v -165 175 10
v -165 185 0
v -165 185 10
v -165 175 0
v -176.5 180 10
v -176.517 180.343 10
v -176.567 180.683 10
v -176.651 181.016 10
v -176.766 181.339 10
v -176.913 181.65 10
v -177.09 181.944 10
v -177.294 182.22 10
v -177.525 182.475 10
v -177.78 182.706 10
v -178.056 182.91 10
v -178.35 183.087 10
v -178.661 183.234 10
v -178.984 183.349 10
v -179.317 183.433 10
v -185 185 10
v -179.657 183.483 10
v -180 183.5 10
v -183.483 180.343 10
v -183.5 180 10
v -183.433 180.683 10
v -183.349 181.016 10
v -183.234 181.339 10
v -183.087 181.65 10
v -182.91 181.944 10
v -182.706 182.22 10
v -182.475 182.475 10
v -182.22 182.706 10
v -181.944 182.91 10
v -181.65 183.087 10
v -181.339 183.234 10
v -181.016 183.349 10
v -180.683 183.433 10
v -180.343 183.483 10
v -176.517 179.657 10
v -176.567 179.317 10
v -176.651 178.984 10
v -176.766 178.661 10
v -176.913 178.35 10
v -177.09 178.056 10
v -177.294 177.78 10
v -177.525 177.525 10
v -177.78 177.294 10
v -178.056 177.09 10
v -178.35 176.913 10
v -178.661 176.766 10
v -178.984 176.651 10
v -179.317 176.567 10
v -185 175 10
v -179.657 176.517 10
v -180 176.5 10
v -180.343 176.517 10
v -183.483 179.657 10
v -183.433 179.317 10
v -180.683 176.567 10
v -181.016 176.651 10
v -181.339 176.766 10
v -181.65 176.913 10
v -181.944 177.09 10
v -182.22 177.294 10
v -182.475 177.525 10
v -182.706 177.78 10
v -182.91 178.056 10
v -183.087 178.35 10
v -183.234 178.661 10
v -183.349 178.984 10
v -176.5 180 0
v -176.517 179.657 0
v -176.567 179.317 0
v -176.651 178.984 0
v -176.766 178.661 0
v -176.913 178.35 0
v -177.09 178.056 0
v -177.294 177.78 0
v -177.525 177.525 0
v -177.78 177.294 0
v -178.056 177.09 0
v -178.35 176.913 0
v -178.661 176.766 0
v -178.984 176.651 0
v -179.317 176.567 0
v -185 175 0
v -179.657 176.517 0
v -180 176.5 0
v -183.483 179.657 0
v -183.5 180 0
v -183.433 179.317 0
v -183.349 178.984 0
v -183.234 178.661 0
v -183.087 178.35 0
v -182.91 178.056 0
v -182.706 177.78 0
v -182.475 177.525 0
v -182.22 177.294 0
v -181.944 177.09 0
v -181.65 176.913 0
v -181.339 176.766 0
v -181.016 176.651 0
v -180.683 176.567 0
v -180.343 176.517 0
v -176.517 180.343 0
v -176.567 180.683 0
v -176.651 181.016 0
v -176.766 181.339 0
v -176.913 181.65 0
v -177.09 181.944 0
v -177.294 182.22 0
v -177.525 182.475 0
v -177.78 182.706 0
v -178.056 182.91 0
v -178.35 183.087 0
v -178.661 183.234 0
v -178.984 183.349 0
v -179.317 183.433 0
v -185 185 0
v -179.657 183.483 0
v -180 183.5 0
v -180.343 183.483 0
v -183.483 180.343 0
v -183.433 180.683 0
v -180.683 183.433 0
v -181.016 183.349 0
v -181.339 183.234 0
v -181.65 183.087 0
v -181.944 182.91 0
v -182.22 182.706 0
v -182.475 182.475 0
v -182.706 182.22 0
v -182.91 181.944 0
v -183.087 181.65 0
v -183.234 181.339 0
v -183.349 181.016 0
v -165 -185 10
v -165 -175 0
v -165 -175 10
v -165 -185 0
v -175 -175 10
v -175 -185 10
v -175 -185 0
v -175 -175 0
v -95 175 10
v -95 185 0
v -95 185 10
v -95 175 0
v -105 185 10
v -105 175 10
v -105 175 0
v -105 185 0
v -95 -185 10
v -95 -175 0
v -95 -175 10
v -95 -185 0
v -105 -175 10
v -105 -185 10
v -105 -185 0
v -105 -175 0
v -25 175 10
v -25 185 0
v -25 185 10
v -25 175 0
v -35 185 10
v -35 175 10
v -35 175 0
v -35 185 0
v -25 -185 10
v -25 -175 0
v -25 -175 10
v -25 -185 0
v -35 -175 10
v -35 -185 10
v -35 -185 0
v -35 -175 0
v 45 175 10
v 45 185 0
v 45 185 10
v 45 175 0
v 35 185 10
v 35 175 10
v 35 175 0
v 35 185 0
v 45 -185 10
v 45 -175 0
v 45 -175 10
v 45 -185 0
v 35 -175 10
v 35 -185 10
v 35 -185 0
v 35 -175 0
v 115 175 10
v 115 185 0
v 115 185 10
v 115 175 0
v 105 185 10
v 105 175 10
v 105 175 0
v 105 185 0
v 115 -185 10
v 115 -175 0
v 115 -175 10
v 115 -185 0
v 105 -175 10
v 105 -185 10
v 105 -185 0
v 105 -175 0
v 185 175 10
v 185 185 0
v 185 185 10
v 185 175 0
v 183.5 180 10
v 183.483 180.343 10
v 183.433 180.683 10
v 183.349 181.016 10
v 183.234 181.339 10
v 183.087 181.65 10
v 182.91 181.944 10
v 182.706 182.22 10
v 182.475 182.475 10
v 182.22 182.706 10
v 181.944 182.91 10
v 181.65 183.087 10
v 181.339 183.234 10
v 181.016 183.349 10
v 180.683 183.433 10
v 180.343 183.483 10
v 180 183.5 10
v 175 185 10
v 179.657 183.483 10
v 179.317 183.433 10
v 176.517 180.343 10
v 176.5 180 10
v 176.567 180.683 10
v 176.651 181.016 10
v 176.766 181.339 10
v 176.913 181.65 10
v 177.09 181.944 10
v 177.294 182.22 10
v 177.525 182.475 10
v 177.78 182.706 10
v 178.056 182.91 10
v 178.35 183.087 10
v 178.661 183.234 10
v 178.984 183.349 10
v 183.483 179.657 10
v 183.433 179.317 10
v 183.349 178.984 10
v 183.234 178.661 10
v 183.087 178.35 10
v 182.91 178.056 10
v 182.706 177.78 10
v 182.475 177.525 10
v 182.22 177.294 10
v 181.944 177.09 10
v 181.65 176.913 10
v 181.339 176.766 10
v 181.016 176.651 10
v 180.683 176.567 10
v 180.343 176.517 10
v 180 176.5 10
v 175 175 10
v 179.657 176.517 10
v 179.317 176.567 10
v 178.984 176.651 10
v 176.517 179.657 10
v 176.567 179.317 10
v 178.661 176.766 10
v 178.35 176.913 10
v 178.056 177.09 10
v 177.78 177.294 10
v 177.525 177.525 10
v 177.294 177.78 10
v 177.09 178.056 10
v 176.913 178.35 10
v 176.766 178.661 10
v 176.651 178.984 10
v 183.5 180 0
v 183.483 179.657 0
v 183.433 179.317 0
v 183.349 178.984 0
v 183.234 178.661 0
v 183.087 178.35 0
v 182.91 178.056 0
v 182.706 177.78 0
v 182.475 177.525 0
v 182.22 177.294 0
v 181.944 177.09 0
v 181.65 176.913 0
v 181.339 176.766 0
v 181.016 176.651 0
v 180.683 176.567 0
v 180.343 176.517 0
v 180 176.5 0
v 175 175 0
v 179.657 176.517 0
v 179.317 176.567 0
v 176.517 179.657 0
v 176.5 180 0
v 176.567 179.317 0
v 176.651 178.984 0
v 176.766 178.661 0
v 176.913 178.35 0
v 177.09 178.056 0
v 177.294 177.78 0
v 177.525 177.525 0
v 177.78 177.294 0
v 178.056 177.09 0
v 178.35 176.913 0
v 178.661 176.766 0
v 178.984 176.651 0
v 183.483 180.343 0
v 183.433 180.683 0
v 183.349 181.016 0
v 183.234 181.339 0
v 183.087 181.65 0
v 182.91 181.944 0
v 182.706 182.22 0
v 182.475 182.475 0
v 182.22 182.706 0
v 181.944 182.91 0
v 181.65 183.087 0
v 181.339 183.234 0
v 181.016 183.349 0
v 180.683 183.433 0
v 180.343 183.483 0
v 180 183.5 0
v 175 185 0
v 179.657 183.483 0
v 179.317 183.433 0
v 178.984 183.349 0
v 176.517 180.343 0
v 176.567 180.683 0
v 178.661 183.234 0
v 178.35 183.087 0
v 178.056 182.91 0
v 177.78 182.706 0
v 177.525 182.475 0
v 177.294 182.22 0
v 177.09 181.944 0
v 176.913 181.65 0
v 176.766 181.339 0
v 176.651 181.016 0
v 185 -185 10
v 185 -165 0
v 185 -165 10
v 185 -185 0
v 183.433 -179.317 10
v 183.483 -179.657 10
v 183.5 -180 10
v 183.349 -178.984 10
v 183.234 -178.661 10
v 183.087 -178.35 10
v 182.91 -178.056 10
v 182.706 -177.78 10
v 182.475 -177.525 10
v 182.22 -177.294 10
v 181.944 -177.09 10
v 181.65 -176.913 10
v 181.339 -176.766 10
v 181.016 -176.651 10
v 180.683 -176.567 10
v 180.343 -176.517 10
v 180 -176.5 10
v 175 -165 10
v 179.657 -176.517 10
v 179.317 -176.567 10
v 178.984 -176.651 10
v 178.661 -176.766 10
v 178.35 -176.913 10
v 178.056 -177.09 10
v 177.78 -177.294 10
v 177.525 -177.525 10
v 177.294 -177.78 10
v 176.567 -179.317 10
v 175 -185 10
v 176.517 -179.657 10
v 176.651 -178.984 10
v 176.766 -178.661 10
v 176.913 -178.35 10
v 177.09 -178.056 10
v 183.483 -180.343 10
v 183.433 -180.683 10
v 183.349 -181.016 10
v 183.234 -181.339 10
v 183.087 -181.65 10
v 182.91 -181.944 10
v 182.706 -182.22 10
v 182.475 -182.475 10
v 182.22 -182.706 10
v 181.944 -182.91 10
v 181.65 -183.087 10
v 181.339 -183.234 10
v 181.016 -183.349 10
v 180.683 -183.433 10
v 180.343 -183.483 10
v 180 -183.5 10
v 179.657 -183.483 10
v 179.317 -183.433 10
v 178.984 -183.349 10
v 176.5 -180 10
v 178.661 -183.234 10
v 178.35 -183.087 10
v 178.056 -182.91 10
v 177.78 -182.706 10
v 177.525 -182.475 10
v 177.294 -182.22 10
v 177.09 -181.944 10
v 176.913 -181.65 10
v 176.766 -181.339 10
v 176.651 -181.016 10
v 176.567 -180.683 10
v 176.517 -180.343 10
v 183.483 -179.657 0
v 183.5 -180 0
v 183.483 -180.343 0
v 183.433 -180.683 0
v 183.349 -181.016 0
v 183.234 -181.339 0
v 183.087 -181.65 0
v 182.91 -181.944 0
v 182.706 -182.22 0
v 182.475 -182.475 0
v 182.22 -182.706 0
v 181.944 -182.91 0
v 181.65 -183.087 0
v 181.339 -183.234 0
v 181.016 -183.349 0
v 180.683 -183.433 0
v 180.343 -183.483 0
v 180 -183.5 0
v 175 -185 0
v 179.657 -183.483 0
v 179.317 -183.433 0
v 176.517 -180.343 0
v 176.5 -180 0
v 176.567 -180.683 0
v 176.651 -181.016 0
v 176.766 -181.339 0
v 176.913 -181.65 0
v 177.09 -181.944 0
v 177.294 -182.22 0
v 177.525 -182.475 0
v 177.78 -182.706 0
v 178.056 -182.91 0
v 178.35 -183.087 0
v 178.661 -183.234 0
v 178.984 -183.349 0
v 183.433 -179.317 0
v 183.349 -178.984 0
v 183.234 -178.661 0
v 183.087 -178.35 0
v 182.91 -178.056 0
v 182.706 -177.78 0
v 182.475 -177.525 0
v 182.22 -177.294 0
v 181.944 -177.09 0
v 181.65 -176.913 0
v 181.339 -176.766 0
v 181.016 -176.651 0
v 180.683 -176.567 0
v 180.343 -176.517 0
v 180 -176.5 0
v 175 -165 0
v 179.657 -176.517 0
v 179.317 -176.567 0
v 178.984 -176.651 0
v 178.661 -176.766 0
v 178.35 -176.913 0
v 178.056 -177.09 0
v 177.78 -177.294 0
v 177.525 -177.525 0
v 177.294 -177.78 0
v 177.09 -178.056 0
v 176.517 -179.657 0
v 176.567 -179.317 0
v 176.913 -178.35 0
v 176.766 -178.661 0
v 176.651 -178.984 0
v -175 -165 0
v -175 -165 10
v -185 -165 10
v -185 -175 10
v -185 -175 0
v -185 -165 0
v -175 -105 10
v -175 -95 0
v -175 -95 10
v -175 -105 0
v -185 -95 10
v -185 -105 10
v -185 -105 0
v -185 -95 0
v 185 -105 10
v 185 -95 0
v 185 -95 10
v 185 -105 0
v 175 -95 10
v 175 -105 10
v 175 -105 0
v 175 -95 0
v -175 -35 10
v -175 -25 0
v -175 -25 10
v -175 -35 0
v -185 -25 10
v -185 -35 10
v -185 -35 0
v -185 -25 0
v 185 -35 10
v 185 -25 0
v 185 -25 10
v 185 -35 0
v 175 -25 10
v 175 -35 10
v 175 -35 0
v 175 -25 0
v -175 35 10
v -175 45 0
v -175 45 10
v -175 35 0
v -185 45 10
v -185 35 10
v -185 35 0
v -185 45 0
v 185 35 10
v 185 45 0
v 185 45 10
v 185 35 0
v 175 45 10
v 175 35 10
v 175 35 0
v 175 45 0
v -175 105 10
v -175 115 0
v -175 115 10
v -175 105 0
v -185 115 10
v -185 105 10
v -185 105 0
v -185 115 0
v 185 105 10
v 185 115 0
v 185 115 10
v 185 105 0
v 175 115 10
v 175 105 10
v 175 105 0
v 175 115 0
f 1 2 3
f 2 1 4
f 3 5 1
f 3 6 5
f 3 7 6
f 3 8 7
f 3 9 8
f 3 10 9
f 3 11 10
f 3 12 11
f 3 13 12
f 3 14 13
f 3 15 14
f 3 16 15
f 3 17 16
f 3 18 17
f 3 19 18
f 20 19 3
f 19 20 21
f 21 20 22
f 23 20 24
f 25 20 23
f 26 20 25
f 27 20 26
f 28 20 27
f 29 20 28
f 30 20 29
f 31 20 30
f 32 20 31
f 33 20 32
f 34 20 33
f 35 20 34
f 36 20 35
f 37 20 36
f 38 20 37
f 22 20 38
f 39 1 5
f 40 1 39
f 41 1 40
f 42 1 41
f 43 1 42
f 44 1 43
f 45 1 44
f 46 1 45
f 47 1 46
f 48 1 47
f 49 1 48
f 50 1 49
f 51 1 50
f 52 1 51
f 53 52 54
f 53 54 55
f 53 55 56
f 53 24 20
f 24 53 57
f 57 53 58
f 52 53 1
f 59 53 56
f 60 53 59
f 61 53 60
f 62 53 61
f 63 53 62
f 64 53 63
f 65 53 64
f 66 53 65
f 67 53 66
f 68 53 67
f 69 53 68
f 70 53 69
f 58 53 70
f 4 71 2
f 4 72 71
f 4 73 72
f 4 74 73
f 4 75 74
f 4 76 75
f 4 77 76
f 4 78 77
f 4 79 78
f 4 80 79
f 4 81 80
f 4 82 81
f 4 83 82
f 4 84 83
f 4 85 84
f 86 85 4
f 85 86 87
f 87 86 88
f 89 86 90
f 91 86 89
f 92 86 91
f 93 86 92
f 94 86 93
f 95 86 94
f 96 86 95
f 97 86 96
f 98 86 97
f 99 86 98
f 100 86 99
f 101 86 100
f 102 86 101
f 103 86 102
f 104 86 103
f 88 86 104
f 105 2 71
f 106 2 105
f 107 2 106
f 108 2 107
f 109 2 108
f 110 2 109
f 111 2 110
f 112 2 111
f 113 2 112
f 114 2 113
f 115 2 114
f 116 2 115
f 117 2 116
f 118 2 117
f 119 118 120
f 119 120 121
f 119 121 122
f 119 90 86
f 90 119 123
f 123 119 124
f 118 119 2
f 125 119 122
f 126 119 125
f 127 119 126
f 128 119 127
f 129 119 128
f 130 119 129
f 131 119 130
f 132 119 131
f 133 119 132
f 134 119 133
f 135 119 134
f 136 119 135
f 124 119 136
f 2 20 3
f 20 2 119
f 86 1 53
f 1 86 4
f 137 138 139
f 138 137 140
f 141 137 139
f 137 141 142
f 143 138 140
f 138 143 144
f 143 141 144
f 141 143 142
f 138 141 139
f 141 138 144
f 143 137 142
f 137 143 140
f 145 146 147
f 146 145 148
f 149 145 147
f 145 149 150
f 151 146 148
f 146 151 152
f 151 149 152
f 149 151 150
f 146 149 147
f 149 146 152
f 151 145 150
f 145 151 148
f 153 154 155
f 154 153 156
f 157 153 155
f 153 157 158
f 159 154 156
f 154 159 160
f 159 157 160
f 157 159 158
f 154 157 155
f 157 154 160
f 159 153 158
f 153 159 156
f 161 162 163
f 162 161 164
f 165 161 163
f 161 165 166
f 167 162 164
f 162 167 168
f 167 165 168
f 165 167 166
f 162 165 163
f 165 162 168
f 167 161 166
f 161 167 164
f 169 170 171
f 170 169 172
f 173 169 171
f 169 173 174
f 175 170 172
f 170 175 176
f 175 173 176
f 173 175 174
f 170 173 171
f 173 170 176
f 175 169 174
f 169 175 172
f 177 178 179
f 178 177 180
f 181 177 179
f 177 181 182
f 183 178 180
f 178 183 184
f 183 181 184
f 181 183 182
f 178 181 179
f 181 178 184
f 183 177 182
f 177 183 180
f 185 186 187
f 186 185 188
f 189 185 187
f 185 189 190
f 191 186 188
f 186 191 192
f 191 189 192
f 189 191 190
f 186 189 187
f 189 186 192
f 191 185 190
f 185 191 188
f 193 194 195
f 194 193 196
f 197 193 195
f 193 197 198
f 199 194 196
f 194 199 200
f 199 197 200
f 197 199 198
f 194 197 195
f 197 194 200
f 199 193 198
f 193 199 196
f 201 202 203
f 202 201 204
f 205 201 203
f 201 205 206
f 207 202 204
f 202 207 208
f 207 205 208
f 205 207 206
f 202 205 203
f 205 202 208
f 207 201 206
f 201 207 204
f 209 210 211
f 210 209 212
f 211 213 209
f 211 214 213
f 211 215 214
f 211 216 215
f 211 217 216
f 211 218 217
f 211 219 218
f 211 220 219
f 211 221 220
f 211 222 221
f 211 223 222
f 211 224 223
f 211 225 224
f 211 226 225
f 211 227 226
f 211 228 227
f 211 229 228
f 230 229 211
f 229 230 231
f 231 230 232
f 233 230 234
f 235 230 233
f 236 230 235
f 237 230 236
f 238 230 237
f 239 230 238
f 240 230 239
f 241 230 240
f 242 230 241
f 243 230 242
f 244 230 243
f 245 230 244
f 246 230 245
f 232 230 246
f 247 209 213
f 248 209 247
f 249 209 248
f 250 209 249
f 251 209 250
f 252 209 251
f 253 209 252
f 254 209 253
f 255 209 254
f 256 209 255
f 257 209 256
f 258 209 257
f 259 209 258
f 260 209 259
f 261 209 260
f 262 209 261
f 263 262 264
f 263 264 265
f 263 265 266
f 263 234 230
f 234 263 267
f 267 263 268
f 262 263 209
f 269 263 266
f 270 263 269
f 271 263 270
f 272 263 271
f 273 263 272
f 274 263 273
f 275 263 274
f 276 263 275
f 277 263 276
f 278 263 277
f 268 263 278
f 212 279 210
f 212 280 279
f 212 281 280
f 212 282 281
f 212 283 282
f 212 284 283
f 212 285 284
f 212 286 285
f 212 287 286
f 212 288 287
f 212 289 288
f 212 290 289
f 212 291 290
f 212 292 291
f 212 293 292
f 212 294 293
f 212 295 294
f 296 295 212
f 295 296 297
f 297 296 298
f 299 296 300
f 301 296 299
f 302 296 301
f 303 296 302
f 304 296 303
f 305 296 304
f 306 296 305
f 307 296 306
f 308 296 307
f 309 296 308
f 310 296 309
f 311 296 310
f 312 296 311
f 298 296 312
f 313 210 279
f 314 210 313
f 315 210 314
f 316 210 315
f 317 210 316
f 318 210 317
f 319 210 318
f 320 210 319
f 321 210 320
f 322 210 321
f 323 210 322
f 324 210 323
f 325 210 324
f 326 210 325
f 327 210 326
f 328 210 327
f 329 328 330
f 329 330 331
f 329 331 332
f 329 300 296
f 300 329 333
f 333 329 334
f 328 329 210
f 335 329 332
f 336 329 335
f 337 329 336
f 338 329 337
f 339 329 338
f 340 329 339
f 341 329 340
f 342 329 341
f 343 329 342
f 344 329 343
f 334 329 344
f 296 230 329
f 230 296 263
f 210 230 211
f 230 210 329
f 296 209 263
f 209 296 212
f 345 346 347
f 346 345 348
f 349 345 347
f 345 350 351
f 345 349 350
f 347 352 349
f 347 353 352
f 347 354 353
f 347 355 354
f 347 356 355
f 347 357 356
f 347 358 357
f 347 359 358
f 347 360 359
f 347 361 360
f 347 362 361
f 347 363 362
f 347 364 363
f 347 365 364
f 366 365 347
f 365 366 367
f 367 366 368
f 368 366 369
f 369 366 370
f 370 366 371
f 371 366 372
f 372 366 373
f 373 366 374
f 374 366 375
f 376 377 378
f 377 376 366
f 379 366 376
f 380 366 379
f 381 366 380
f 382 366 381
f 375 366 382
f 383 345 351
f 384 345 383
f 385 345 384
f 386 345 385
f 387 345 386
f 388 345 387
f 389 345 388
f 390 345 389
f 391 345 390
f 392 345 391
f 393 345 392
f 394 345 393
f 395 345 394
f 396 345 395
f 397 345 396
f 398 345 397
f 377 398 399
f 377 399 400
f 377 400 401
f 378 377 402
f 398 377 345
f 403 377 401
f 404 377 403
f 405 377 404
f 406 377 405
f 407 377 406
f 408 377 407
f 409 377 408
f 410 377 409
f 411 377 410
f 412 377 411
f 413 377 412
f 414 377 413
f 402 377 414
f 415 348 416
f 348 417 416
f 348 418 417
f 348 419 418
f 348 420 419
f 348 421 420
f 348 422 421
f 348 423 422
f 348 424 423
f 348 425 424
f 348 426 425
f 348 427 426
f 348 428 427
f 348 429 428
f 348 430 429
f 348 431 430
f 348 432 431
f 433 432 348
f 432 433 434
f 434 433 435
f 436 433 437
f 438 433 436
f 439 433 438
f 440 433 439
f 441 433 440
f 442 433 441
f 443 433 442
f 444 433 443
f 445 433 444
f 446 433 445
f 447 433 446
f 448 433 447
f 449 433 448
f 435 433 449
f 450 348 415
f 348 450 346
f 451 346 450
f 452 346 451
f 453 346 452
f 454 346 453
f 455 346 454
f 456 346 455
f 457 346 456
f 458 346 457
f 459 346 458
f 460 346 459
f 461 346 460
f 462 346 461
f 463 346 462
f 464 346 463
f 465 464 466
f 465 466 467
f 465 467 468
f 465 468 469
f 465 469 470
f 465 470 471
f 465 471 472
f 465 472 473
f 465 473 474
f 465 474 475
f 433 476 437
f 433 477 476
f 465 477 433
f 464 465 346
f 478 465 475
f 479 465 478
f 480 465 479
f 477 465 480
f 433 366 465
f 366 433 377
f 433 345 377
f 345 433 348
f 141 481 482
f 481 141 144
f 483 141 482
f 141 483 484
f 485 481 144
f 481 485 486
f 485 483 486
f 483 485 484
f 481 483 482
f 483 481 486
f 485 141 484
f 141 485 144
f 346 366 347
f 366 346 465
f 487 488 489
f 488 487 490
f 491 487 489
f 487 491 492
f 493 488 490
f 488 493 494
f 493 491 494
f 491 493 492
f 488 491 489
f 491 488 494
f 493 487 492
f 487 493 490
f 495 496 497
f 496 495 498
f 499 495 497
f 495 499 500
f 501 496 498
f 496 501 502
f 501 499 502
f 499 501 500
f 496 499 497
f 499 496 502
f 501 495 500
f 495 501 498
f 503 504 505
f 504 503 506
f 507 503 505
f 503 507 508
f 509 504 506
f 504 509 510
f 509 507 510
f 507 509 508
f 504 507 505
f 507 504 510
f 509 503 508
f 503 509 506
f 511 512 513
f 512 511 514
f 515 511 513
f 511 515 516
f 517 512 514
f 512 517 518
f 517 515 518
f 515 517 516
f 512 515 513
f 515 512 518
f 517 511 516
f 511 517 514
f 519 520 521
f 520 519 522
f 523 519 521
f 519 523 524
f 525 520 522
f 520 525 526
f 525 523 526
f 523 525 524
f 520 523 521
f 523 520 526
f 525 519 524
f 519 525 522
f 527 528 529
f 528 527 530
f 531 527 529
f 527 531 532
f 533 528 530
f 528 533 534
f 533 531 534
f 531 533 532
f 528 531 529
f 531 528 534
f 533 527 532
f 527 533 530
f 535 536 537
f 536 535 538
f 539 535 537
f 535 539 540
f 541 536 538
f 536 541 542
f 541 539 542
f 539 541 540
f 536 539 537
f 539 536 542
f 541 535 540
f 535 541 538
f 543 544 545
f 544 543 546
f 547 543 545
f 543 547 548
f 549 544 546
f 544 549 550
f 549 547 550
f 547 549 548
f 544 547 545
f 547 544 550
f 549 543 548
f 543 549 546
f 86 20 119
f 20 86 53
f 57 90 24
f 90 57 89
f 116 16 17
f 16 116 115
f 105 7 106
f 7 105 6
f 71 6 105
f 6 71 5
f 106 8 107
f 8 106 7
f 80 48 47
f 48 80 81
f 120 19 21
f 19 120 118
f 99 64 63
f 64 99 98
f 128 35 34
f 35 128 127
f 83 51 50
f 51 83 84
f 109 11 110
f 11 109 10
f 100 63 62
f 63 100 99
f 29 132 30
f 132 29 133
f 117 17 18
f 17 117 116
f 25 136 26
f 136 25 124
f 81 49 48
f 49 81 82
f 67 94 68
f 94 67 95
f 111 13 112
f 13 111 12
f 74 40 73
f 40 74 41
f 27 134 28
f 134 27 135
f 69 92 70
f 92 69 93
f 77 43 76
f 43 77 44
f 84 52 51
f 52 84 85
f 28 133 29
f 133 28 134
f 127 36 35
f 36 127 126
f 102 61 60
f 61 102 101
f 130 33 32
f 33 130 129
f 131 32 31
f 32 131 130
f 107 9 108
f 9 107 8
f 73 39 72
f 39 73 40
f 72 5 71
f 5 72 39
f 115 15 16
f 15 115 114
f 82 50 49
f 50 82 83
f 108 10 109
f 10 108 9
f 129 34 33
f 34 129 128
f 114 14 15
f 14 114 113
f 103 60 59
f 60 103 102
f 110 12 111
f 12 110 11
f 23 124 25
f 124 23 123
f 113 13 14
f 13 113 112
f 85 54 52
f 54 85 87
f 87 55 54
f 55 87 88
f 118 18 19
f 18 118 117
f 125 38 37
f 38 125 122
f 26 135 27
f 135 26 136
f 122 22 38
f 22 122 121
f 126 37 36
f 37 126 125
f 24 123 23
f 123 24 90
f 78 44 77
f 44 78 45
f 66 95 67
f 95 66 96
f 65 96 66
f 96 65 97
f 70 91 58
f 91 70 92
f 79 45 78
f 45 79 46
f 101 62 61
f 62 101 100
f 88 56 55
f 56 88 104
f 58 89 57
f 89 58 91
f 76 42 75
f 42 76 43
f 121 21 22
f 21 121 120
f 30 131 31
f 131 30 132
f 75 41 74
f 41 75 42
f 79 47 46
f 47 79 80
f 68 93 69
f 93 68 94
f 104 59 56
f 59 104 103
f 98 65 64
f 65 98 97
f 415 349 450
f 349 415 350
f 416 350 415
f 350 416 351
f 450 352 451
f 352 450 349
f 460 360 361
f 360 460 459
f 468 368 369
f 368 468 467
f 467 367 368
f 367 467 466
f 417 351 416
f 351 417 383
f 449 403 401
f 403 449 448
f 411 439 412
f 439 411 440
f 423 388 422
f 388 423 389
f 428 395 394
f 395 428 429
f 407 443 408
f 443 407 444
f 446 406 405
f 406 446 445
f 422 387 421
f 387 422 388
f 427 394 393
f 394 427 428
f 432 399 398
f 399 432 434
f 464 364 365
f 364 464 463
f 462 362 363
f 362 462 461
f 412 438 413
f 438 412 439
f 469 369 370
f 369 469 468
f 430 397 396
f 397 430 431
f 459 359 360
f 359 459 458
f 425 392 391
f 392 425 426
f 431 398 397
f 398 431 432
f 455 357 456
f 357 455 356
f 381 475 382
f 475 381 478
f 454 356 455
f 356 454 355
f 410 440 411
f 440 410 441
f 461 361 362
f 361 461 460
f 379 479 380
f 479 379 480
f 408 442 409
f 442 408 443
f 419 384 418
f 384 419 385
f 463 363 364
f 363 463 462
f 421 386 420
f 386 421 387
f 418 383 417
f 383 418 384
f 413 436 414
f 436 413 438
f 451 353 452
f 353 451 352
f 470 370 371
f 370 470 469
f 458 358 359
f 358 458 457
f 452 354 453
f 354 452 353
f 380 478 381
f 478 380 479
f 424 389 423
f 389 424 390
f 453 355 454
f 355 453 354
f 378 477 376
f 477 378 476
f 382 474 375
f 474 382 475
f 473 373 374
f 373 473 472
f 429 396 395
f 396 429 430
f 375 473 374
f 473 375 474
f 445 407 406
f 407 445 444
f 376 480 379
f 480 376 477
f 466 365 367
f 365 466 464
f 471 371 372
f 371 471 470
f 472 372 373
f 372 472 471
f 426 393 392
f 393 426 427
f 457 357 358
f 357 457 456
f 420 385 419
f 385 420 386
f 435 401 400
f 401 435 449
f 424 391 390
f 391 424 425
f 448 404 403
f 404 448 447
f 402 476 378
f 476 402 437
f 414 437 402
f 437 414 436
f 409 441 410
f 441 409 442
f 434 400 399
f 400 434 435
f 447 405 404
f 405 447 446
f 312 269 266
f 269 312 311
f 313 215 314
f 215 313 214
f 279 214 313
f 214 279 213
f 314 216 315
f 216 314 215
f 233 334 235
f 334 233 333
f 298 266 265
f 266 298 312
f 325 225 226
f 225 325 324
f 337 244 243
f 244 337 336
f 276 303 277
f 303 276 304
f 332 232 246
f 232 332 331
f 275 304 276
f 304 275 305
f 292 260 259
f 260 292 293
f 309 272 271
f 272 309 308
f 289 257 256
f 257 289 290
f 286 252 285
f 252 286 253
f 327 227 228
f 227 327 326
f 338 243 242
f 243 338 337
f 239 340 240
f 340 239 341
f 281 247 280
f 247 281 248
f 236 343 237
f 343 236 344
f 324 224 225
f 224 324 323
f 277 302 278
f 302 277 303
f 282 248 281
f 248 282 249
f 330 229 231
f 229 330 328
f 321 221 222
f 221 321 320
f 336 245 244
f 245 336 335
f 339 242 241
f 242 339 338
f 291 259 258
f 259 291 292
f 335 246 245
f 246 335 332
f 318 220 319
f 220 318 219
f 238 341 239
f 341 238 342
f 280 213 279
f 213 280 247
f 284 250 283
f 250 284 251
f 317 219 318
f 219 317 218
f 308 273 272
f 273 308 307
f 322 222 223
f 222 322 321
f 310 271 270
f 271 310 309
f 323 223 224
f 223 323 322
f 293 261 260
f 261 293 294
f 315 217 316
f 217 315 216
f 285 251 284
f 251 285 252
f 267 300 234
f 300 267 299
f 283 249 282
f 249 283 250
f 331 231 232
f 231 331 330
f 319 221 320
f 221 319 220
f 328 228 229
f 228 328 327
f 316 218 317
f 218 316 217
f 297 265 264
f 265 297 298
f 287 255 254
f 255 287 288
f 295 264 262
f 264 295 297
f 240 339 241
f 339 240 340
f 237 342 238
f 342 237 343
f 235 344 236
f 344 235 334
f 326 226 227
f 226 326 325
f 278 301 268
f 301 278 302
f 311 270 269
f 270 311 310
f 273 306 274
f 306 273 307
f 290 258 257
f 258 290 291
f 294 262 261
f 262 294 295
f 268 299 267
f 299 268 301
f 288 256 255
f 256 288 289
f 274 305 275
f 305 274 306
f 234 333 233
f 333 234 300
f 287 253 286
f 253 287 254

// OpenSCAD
// ring_04.scad - ring index 4 (z bottom = 40 mm)
$fn = 64; bar = 10; half_b = bar/2; outer = 370; half_outer = outer/2;
front_y = 180; back_y = -180; left_x = -180; right_x = 180;
x_centers = [-170, -100, -30, 40, 110, 180];
z_centers = [5, 85, 155, 225, 295, 365, 435, 505, 575, 645, 715]; ring_z = 40;
module place_box(cx, cy, sx, sy) { translate([cx - sx/2, cy - sy/2, 0]) cube([sx, sy, bar]); }

difference() { union() {
    for (x = x_centers) { place_box(x, front_y, bar, bar); place_box(x, back_y, bar, bar); }
    for (y = x_centers) { place_box(left_x, y, bar, bar); place_box(right_x, y, bar, bar); }
    for (zc = z_centers) if ((zc - half_b < ring_z + bar) && (zc + half_b > ring_z)) {
        translate([-half_outer, front_y - half_b, 0]) cube([outer, bar, bar]);
        translate([-half_outer, back_y - half_b, 0])  cube([outer, bar, bar]);
        translate([left_x - half_b, -half_outer, 0])  cube([bar, outer, bar]);
        translate([right_x - half_b, -half_outer, 0]) cube([bar, outer, bar]);
    }
  }
  for (cx = [-180, 180]) for (cy = [-180, 180]) translate([cx, cy, 0]) cylinder(h = bar, r = 3.5, $fn = 64);
}
